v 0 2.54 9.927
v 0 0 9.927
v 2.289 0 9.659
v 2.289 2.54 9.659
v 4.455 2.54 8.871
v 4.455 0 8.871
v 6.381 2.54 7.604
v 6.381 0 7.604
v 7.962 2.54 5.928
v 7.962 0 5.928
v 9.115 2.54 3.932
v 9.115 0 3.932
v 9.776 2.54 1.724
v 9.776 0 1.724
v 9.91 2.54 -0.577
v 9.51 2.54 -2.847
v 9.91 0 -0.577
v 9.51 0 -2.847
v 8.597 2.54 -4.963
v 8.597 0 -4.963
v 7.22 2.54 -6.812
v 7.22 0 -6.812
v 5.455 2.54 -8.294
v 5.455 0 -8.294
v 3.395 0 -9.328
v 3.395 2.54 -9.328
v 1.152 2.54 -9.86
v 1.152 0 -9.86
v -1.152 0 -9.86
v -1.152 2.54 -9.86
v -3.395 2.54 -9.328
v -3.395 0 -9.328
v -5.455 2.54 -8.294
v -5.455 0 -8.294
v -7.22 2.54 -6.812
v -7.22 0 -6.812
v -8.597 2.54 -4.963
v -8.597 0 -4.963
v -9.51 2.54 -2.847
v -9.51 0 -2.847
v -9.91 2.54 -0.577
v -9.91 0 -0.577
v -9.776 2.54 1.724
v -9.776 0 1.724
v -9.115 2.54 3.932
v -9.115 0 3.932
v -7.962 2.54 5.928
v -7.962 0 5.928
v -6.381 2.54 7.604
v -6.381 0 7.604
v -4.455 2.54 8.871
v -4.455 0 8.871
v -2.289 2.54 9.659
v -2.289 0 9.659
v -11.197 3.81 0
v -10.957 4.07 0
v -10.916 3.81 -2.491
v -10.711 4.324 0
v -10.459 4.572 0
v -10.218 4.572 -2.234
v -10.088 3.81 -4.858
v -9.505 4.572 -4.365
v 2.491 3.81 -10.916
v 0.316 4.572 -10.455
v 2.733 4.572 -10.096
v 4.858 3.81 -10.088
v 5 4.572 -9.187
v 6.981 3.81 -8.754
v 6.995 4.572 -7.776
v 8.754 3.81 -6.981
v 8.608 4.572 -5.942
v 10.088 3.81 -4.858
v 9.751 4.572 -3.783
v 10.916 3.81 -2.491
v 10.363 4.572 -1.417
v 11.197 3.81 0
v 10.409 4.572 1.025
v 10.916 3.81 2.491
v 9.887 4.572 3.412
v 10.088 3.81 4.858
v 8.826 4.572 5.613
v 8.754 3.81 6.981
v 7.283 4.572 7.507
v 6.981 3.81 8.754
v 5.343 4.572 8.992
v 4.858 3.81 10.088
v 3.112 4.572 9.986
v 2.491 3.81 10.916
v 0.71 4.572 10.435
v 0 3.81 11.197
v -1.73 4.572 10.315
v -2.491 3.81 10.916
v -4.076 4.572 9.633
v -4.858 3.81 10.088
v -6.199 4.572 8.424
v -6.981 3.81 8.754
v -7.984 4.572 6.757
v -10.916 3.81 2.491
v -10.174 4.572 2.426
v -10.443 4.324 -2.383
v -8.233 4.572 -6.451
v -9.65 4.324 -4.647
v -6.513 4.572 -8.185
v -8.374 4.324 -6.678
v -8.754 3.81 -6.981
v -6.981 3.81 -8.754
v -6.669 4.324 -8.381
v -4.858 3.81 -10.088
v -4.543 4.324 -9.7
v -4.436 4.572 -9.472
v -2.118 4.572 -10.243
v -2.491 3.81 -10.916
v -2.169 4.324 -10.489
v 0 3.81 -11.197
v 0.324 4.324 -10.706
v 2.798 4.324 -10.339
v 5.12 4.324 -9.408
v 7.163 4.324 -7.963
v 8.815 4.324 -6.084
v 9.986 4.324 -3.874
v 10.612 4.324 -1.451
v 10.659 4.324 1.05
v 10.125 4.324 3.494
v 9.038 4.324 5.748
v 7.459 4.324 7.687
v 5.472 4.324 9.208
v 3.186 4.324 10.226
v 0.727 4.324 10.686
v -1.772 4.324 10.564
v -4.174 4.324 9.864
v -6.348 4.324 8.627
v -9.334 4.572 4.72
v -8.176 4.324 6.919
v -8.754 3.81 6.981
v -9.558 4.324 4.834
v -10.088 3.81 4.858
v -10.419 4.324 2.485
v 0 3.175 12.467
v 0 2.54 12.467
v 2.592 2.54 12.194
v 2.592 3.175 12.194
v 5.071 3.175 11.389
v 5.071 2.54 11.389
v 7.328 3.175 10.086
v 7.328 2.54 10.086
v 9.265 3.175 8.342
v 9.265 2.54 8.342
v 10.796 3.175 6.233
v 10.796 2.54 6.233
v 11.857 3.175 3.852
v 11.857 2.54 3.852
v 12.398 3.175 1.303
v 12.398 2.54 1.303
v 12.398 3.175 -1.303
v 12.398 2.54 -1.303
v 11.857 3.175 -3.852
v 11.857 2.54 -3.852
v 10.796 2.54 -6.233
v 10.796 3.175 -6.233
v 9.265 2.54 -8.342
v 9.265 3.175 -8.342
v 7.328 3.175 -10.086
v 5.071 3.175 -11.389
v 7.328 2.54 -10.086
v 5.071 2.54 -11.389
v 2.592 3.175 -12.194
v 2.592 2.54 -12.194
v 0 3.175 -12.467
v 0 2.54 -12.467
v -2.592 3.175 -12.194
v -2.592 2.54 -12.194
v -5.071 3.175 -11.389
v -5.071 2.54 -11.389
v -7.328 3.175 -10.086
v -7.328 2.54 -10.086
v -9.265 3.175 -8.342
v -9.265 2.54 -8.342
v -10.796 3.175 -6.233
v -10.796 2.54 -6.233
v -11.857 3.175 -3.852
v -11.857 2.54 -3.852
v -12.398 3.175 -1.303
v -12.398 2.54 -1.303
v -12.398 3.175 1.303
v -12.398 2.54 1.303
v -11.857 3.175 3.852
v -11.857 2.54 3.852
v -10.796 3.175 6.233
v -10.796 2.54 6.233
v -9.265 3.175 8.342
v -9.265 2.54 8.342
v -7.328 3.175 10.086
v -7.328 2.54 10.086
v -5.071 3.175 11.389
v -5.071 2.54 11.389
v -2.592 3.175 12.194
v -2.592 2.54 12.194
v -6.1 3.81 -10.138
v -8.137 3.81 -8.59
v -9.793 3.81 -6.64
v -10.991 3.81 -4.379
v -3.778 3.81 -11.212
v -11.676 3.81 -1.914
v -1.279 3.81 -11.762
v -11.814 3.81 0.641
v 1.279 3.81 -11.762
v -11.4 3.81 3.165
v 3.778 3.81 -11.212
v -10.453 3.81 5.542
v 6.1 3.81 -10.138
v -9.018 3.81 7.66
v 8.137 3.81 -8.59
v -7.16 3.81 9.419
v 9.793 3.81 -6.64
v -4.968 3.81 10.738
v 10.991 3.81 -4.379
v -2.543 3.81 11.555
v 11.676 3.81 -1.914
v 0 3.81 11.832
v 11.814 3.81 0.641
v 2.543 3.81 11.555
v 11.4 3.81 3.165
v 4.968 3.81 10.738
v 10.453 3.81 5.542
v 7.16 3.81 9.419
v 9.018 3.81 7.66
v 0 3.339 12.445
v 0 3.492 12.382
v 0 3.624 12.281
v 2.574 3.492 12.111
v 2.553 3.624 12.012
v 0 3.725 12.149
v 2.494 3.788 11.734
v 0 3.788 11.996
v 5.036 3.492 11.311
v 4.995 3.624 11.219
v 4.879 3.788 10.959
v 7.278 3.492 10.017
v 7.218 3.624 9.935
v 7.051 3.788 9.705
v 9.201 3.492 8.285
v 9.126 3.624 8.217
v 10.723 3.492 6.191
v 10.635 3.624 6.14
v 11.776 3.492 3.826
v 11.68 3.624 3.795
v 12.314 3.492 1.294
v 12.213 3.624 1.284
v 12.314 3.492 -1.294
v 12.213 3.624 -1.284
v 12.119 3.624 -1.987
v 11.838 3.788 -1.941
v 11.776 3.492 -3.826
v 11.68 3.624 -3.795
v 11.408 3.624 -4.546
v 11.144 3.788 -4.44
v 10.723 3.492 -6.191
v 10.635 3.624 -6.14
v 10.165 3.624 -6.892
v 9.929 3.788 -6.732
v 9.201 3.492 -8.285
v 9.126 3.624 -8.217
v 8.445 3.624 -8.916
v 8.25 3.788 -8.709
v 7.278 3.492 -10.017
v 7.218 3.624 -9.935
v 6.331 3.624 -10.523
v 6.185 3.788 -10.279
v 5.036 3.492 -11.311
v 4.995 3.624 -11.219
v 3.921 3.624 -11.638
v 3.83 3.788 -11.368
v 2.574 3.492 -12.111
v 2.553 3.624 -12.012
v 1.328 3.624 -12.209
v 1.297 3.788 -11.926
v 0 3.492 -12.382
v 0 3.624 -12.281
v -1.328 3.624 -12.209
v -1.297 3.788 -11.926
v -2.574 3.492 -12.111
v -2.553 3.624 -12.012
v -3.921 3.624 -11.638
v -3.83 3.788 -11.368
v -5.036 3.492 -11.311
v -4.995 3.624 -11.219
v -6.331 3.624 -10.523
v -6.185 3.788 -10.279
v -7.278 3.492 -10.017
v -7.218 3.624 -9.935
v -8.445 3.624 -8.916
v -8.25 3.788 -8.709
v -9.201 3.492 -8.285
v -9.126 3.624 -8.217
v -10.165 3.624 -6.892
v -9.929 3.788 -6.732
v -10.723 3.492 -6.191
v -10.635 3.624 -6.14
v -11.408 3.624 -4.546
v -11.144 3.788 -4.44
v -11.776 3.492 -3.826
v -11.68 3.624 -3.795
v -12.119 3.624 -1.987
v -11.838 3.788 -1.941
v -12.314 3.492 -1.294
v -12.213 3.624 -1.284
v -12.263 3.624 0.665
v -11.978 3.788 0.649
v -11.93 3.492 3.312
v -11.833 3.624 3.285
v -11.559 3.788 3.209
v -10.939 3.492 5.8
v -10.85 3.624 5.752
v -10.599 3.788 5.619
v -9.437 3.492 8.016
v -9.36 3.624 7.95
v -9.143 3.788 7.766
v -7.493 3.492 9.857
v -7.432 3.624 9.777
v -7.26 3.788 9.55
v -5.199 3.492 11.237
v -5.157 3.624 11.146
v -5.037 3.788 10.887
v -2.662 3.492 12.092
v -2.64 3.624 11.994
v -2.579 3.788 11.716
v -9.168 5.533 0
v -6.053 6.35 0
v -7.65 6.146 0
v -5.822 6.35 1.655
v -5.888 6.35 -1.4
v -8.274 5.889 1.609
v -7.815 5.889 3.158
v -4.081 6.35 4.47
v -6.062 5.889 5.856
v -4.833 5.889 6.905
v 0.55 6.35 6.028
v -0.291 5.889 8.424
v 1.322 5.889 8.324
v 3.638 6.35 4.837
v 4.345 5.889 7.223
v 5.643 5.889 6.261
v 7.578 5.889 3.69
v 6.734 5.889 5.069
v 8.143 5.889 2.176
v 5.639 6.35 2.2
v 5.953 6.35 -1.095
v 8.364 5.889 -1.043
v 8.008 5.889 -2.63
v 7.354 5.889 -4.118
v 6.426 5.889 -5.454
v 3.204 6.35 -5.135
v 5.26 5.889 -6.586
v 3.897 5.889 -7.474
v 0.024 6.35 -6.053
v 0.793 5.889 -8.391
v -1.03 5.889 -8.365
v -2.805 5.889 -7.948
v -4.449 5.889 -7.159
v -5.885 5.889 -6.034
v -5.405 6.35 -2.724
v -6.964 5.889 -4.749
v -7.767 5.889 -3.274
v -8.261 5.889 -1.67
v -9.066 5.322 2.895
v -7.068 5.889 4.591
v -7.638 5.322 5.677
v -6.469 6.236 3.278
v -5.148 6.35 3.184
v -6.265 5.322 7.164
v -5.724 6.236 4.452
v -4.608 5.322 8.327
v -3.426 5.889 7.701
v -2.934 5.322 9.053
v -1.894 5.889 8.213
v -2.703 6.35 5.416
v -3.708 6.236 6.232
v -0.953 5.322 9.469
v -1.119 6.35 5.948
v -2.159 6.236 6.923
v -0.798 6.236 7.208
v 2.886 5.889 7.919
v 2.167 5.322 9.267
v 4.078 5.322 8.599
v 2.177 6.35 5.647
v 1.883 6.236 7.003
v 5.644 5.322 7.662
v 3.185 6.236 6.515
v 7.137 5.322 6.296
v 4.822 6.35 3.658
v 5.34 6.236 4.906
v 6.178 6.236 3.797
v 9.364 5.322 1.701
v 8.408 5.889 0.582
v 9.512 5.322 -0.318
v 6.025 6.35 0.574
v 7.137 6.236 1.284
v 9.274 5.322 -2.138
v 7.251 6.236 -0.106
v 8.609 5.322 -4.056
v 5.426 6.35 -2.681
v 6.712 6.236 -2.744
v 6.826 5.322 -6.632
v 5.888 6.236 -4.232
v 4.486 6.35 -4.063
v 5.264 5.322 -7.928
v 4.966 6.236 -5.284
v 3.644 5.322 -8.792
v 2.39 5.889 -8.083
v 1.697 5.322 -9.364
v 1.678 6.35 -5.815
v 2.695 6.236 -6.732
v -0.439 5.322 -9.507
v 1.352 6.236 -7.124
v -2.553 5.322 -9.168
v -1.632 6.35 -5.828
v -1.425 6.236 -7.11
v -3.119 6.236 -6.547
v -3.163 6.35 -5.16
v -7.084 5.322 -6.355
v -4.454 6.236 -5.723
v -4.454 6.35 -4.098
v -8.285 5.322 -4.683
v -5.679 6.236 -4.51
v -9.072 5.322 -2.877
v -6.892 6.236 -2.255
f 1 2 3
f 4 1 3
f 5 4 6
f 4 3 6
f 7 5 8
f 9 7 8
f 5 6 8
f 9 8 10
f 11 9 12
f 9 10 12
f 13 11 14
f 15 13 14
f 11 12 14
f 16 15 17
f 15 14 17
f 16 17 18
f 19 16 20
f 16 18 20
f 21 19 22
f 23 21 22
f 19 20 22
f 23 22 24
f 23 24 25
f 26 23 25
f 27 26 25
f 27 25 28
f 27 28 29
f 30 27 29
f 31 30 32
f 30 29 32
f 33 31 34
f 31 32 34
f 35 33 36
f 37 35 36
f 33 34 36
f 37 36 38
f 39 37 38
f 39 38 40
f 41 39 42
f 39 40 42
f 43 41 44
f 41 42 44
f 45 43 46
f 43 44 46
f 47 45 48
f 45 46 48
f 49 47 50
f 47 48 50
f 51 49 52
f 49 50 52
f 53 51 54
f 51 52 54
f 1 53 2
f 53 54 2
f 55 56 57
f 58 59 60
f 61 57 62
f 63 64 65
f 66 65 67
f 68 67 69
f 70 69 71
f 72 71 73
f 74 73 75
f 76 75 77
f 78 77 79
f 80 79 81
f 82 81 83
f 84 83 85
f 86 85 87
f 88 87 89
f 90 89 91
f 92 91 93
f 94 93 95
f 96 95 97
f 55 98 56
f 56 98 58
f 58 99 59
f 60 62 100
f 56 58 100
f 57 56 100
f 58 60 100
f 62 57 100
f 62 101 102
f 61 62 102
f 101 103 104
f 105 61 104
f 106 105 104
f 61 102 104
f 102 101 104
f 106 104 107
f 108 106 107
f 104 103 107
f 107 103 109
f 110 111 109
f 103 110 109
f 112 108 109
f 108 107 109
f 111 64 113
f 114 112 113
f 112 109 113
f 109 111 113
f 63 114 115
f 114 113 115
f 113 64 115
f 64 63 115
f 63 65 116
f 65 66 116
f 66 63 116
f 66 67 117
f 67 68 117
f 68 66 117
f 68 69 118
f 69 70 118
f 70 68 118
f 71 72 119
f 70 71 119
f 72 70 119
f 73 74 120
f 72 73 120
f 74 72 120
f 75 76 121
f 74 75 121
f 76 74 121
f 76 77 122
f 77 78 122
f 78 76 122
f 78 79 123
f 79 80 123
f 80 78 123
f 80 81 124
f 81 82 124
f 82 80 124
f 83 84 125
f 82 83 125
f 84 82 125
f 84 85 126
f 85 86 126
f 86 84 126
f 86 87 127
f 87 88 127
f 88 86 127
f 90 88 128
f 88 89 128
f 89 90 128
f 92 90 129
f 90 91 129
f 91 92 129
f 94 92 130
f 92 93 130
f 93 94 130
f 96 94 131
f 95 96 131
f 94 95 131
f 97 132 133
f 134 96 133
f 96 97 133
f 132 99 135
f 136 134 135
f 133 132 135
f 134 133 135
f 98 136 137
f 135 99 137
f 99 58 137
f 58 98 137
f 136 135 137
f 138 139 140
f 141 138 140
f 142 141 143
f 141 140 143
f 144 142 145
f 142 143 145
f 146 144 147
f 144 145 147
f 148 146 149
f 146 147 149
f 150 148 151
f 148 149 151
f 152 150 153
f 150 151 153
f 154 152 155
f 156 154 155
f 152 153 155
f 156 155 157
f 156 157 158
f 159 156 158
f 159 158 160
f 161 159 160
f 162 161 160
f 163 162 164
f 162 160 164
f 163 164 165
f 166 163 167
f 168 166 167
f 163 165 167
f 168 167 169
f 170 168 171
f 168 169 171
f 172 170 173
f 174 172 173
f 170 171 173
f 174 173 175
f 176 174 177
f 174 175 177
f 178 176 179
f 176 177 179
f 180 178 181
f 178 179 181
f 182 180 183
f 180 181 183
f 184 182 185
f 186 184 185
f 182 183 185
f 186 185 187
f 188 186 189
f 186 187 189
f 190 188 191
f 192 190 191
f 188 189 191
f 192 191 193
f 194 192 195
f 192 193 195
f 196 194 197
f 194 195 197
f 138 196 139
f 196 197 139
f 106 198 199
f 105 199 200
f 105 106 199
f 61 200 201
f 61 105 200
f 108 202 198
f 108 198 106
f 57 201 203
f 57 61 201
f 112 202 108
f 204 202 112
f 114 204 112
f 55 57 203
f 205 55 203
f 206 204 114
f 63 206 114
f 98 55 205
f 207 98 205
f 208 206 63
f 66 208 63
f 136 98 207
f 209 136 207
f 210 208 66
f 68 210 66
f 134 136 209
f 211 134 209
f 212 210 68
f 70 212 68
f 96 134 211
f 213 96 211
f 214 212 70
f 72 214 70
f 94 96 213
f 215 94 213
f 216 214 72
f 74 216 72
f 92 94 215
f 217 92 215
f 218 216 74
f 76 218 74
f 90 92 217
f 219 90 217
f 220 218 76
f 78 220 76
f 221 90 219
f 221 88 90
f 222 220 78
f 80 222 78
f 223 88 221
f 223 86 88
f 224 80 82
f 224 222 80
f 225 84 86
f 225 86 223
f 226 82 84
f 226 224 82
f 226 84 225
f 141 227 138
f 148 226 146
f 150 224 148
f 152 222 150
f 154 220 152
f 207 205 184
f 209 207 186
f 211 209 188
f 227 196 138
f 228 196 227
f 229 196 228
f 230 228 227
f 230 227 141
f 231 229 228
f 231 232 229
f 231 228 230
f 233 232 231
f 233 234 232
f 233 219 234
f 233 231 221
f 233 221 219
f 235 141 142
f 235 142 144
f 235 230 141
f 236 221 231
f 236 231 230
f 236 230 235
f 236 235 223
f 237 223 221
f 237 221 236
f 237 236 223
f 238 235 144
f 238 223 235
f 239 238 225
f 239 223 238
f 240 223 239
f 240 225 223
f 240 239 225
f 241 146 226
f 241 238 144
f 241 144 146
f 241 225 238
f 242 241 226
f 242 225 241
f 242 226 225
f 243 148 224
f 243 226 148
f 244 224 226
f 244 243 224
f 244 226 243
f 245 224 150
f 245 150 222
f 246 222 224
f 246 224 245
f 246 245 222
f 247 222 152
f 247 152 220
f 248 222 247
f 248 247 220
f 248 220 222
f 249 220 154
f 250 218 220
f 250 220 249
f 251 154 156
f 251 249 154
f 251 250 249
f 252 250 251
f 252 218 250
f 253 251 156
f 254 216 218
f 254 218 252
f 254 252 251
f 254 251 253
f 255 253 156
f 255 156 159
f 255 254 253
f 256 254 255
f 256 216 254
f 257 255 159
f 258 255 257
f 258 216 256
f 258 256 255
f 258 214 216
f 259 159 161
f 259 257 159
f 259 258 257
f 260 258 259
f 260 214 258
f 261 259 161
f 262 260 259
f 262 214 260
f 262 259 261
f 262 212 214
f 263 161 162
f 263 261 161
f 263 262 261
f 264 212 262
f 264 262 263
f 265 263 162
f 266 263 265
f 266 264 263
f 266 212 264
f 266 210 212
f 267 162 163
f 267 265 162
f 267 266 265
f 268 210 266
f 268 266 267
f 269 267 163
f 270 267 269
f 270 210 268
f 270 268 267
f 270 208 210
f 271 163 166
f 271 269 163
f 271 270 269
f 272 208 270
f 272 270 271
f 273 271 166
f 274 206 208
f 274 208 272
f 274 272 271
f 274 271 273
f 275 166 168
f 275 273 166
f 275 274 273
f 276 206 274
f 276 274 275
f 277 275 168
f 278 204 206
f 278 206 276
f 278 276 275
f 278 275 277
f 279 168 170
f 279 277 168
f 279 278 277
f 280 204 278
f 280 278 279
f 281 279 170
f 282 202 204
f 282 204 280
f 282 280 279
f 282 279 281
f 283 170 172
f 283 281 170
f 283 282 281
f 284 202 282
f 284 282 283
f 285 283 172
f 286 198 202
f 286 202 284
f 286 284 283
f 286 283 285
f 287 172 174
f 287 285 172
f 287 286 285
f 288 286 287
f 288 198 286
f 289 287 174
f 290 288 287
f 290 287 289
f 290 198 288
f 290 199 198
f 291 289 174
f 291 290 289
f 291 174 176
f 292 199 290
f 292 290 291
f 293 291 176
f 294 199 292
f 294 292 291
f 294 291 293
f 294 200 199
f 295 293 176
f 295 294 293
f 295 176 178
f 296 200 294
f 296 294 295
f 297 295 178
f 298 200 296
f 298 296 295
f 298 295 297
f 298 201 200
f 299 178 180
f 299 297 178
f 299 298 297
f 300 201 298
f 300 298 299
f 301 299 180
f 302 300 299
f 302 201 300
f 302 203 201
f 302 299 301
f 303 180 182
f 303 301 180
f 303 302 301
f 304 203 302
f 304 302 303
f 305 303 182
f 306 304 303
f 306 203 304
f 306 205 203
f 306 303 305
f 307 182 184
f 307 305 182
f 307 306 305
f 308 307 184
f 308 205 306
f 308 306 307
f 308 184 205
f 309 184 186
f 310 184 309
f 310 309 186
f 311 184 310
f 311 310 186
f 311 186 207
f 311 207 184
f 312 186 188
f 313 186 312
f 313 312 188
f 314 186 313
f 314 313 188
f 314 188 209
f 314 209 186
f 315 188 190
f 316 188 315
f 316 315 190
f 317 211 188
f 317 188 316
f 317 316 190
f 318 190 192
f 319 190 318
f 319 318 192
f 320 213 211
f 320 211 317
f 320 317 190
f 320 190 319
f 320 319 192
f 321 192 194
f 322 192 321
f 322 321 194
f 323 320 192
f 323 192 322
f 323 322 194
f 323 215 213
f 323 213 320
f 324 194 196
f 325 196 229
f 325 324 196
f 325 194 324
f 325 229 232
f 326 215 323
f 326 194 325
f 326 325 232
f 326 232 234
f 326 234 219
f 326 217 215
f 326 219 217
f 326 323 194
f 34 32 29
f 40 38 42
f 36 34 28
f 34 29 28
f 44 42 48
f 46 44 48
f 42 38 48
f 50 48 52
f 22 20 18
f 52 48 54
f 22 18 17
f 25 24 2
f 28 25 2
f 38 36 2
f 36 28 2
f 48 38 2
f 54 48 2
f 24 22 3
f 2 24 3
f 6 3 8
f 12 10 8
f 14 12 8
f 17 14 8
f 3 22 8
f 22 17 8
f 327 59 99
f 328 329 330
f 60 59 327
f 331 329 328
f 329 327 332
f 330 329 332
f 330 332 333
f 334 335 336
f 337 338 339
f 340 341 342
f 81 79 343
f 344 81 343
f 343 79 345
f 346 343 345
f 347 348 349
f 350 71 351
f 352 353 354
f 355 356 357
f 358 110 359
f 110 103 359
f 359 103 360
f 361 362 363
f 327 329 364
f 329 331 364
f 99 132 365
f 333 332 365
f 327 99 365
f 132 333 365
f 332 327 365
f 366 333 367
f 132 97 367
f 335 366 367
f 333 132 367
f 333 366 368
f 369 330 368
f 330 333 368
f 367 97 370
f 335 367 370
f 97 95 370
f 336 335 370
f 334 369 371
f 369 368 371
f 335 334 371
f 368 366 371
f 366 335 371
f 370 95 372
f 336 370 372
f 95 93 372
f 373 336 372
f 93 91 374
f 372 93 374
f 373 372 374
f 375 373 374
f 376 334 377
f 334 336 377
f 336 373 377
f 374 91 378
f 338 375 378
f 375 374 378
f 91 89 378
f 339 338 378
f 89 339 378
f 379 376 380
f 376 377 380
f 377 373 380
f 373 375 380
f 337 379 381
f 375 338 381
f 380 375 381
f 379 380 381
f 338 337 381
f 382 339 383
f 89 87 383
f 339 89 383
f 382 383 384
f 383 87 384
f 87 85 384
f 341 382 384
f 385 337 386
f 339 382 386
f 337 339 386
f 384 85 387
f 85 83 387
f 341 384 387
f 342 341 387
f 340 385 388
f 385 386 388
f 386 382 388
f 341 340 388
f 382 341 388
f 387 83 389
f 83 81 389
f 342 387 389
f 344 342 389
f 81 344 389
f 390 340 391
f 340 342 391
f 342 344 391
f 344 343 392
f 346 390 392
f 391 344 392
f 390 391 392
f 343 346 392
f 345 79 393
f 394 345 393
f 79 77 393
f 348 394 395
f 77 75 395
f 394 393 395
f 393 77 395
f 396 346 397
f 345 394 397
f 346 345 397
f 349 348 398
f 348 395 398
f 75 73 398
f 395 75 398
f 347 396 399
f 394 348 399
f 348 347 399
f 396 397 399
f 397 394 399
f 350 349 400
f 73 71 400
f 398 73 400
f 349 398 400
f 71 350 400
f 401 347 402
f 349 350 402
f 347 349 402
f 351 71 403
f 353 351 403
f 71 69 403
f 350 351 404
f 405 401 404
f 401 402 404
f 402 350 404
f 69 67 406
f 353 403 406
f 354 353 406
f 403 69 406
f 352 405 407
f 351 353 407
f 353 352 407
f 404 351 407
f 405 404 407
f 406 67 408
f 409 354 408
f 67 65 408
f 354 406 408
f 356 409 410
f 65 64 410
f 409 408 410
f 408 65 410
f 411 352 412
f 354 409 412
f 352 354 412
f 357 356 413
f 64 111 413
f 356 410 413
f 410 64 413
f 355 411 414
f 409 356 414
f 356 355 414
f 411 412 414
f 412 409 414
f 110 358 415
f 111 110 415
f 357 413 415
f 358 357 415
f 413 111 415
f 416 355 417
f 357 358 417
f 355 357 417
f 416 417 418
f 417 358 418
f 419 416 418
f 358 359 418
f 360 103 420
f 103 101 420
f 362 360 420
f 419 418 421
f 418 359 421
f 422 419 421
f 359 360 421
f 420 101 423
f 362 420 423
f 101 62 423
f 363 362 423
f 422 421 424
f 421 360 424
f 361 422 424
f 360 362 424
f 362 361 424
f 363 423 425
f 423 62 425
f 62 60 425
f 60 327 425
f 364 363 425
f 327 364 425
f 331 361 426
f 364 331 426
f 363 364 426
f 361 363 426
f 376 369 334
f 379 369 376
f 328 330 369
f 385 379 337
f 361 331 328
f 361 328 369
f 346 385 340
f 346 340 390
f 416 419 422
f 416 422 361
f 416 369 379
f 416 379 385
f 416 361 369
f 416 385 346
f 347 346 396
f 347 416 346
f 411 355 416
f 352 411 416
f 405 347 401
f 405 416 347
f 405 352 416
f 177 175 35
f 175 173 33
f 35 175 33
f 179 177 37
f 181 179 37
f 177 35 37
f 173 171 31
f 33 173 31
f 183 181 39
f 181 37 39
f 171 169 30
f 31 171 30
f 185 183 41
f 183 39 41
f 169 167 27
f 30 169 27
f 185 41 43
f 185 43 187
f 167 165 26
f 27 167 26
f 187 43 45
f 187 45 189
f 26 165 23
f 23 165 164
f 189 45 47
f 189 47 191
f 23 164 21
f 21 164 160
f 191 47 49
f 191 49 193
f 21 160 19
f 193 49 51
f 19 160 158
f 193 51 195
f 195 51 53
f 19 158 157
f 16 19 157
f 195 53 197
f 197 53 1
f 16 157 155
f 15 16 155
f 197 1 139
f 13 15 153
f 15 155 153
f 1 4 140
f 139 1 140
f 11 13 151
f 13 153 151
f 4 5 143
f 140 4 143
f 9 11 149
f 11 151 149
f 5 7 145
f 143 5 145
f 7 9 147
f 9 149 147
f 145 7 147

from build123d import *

# Parameters (mm, degrees)
SKETCH1_R               = 9.926666649
BOSS_EXTRUDE1_DEPTH     = 2.54
SKETCH2_R               = 12.466666649
BOSS_EXTRUDE2_DEPTH     = 1.27
FILLET1_R               = 0.635
CUT_EXTRUDE1_DEPTH      = 20.718919442
CUT_EXTRUDE1_DEPTH_BACK = 20.718919442
SKETCH4_W               = 27.24769987
SKETCH4_H               = 6.35
FILLET2_R               = 6.35


with BuildPart() as part:
    # Sketch1 → Boss-Extrude1 (new body)
    with BuildSketch(Plane(origin=(0, 0, 0), x_dir=(1, 0, 0), z_dir=(0, 1, 0))):
        with Locations(Location((0, 0, 0), (0, 0, 270))):
            Circle(SKETCH1_R)
    extrude(amount=BOSS_EXTRUDE1_DEPTH)

    # Sketch2 → Boss-Extrude2 (add)
    with BuildSketch(Plane(origin=(0, 2.54, 0), x_dir=(1, 0, 0), z_dir=(0, 1, 0))):
        with Locations(Location((0, 0, 0), (0, 0, 270))):
            Circle(SKETCH2_R)
    extrude(amount=BOSS_EXTRUDE2_DEPTH)

    # Sketch3 → Revolve1 (revolve)
    with BuildSketch(Plane.XY):
        with BuildLine():
            Line((0, 8.831773608), (0, 3.81))
            Line((0, 3.81), (-11.196666649, 3.81))
            ThreePointArc((-11.196666649, 3.81), (-6.127083682, 7.49980126), (0, 8.831773608))
        make_face()
    revolve(axis=Axis((0, 8.831773608, 0), (0, -1, 0)))

    # Fillet1
    fillet1_edges = [part.edges().sort_by_distance(p)[0] for p in [
        (0, 3.81, -12.466666649),
    ]]
    fillet(fillet1_edges, radius=FILLET1_R)

    # Sketch4 → Cut-Extrude1 (cut, two sides: drawn at the far end of the back side and taken through both)
    with BuildSketch(Plane.XY.offset(-CUT_EXTRUDE1_DEPTH_BACK)):
        with Locations((-1.310749411, 9.525)):
            Rectangle(SKETCH4_W, SKETCH4_H)
    extrude(amount=CUT_EXTRUDE1_DEPTH + CUT_EXTRUDE1_DEPTH_BACK, mode=Mode.SUBTRACT)

    # Fillet2
    fillet2_edges = [part.edges().sort_by_distance(p)[0] for p in [
        (8.22955279, 6.35, -5e-09),
    ]]
    fillet(fillet2_edges, radius=FILLET2_R)


solid = part.part
